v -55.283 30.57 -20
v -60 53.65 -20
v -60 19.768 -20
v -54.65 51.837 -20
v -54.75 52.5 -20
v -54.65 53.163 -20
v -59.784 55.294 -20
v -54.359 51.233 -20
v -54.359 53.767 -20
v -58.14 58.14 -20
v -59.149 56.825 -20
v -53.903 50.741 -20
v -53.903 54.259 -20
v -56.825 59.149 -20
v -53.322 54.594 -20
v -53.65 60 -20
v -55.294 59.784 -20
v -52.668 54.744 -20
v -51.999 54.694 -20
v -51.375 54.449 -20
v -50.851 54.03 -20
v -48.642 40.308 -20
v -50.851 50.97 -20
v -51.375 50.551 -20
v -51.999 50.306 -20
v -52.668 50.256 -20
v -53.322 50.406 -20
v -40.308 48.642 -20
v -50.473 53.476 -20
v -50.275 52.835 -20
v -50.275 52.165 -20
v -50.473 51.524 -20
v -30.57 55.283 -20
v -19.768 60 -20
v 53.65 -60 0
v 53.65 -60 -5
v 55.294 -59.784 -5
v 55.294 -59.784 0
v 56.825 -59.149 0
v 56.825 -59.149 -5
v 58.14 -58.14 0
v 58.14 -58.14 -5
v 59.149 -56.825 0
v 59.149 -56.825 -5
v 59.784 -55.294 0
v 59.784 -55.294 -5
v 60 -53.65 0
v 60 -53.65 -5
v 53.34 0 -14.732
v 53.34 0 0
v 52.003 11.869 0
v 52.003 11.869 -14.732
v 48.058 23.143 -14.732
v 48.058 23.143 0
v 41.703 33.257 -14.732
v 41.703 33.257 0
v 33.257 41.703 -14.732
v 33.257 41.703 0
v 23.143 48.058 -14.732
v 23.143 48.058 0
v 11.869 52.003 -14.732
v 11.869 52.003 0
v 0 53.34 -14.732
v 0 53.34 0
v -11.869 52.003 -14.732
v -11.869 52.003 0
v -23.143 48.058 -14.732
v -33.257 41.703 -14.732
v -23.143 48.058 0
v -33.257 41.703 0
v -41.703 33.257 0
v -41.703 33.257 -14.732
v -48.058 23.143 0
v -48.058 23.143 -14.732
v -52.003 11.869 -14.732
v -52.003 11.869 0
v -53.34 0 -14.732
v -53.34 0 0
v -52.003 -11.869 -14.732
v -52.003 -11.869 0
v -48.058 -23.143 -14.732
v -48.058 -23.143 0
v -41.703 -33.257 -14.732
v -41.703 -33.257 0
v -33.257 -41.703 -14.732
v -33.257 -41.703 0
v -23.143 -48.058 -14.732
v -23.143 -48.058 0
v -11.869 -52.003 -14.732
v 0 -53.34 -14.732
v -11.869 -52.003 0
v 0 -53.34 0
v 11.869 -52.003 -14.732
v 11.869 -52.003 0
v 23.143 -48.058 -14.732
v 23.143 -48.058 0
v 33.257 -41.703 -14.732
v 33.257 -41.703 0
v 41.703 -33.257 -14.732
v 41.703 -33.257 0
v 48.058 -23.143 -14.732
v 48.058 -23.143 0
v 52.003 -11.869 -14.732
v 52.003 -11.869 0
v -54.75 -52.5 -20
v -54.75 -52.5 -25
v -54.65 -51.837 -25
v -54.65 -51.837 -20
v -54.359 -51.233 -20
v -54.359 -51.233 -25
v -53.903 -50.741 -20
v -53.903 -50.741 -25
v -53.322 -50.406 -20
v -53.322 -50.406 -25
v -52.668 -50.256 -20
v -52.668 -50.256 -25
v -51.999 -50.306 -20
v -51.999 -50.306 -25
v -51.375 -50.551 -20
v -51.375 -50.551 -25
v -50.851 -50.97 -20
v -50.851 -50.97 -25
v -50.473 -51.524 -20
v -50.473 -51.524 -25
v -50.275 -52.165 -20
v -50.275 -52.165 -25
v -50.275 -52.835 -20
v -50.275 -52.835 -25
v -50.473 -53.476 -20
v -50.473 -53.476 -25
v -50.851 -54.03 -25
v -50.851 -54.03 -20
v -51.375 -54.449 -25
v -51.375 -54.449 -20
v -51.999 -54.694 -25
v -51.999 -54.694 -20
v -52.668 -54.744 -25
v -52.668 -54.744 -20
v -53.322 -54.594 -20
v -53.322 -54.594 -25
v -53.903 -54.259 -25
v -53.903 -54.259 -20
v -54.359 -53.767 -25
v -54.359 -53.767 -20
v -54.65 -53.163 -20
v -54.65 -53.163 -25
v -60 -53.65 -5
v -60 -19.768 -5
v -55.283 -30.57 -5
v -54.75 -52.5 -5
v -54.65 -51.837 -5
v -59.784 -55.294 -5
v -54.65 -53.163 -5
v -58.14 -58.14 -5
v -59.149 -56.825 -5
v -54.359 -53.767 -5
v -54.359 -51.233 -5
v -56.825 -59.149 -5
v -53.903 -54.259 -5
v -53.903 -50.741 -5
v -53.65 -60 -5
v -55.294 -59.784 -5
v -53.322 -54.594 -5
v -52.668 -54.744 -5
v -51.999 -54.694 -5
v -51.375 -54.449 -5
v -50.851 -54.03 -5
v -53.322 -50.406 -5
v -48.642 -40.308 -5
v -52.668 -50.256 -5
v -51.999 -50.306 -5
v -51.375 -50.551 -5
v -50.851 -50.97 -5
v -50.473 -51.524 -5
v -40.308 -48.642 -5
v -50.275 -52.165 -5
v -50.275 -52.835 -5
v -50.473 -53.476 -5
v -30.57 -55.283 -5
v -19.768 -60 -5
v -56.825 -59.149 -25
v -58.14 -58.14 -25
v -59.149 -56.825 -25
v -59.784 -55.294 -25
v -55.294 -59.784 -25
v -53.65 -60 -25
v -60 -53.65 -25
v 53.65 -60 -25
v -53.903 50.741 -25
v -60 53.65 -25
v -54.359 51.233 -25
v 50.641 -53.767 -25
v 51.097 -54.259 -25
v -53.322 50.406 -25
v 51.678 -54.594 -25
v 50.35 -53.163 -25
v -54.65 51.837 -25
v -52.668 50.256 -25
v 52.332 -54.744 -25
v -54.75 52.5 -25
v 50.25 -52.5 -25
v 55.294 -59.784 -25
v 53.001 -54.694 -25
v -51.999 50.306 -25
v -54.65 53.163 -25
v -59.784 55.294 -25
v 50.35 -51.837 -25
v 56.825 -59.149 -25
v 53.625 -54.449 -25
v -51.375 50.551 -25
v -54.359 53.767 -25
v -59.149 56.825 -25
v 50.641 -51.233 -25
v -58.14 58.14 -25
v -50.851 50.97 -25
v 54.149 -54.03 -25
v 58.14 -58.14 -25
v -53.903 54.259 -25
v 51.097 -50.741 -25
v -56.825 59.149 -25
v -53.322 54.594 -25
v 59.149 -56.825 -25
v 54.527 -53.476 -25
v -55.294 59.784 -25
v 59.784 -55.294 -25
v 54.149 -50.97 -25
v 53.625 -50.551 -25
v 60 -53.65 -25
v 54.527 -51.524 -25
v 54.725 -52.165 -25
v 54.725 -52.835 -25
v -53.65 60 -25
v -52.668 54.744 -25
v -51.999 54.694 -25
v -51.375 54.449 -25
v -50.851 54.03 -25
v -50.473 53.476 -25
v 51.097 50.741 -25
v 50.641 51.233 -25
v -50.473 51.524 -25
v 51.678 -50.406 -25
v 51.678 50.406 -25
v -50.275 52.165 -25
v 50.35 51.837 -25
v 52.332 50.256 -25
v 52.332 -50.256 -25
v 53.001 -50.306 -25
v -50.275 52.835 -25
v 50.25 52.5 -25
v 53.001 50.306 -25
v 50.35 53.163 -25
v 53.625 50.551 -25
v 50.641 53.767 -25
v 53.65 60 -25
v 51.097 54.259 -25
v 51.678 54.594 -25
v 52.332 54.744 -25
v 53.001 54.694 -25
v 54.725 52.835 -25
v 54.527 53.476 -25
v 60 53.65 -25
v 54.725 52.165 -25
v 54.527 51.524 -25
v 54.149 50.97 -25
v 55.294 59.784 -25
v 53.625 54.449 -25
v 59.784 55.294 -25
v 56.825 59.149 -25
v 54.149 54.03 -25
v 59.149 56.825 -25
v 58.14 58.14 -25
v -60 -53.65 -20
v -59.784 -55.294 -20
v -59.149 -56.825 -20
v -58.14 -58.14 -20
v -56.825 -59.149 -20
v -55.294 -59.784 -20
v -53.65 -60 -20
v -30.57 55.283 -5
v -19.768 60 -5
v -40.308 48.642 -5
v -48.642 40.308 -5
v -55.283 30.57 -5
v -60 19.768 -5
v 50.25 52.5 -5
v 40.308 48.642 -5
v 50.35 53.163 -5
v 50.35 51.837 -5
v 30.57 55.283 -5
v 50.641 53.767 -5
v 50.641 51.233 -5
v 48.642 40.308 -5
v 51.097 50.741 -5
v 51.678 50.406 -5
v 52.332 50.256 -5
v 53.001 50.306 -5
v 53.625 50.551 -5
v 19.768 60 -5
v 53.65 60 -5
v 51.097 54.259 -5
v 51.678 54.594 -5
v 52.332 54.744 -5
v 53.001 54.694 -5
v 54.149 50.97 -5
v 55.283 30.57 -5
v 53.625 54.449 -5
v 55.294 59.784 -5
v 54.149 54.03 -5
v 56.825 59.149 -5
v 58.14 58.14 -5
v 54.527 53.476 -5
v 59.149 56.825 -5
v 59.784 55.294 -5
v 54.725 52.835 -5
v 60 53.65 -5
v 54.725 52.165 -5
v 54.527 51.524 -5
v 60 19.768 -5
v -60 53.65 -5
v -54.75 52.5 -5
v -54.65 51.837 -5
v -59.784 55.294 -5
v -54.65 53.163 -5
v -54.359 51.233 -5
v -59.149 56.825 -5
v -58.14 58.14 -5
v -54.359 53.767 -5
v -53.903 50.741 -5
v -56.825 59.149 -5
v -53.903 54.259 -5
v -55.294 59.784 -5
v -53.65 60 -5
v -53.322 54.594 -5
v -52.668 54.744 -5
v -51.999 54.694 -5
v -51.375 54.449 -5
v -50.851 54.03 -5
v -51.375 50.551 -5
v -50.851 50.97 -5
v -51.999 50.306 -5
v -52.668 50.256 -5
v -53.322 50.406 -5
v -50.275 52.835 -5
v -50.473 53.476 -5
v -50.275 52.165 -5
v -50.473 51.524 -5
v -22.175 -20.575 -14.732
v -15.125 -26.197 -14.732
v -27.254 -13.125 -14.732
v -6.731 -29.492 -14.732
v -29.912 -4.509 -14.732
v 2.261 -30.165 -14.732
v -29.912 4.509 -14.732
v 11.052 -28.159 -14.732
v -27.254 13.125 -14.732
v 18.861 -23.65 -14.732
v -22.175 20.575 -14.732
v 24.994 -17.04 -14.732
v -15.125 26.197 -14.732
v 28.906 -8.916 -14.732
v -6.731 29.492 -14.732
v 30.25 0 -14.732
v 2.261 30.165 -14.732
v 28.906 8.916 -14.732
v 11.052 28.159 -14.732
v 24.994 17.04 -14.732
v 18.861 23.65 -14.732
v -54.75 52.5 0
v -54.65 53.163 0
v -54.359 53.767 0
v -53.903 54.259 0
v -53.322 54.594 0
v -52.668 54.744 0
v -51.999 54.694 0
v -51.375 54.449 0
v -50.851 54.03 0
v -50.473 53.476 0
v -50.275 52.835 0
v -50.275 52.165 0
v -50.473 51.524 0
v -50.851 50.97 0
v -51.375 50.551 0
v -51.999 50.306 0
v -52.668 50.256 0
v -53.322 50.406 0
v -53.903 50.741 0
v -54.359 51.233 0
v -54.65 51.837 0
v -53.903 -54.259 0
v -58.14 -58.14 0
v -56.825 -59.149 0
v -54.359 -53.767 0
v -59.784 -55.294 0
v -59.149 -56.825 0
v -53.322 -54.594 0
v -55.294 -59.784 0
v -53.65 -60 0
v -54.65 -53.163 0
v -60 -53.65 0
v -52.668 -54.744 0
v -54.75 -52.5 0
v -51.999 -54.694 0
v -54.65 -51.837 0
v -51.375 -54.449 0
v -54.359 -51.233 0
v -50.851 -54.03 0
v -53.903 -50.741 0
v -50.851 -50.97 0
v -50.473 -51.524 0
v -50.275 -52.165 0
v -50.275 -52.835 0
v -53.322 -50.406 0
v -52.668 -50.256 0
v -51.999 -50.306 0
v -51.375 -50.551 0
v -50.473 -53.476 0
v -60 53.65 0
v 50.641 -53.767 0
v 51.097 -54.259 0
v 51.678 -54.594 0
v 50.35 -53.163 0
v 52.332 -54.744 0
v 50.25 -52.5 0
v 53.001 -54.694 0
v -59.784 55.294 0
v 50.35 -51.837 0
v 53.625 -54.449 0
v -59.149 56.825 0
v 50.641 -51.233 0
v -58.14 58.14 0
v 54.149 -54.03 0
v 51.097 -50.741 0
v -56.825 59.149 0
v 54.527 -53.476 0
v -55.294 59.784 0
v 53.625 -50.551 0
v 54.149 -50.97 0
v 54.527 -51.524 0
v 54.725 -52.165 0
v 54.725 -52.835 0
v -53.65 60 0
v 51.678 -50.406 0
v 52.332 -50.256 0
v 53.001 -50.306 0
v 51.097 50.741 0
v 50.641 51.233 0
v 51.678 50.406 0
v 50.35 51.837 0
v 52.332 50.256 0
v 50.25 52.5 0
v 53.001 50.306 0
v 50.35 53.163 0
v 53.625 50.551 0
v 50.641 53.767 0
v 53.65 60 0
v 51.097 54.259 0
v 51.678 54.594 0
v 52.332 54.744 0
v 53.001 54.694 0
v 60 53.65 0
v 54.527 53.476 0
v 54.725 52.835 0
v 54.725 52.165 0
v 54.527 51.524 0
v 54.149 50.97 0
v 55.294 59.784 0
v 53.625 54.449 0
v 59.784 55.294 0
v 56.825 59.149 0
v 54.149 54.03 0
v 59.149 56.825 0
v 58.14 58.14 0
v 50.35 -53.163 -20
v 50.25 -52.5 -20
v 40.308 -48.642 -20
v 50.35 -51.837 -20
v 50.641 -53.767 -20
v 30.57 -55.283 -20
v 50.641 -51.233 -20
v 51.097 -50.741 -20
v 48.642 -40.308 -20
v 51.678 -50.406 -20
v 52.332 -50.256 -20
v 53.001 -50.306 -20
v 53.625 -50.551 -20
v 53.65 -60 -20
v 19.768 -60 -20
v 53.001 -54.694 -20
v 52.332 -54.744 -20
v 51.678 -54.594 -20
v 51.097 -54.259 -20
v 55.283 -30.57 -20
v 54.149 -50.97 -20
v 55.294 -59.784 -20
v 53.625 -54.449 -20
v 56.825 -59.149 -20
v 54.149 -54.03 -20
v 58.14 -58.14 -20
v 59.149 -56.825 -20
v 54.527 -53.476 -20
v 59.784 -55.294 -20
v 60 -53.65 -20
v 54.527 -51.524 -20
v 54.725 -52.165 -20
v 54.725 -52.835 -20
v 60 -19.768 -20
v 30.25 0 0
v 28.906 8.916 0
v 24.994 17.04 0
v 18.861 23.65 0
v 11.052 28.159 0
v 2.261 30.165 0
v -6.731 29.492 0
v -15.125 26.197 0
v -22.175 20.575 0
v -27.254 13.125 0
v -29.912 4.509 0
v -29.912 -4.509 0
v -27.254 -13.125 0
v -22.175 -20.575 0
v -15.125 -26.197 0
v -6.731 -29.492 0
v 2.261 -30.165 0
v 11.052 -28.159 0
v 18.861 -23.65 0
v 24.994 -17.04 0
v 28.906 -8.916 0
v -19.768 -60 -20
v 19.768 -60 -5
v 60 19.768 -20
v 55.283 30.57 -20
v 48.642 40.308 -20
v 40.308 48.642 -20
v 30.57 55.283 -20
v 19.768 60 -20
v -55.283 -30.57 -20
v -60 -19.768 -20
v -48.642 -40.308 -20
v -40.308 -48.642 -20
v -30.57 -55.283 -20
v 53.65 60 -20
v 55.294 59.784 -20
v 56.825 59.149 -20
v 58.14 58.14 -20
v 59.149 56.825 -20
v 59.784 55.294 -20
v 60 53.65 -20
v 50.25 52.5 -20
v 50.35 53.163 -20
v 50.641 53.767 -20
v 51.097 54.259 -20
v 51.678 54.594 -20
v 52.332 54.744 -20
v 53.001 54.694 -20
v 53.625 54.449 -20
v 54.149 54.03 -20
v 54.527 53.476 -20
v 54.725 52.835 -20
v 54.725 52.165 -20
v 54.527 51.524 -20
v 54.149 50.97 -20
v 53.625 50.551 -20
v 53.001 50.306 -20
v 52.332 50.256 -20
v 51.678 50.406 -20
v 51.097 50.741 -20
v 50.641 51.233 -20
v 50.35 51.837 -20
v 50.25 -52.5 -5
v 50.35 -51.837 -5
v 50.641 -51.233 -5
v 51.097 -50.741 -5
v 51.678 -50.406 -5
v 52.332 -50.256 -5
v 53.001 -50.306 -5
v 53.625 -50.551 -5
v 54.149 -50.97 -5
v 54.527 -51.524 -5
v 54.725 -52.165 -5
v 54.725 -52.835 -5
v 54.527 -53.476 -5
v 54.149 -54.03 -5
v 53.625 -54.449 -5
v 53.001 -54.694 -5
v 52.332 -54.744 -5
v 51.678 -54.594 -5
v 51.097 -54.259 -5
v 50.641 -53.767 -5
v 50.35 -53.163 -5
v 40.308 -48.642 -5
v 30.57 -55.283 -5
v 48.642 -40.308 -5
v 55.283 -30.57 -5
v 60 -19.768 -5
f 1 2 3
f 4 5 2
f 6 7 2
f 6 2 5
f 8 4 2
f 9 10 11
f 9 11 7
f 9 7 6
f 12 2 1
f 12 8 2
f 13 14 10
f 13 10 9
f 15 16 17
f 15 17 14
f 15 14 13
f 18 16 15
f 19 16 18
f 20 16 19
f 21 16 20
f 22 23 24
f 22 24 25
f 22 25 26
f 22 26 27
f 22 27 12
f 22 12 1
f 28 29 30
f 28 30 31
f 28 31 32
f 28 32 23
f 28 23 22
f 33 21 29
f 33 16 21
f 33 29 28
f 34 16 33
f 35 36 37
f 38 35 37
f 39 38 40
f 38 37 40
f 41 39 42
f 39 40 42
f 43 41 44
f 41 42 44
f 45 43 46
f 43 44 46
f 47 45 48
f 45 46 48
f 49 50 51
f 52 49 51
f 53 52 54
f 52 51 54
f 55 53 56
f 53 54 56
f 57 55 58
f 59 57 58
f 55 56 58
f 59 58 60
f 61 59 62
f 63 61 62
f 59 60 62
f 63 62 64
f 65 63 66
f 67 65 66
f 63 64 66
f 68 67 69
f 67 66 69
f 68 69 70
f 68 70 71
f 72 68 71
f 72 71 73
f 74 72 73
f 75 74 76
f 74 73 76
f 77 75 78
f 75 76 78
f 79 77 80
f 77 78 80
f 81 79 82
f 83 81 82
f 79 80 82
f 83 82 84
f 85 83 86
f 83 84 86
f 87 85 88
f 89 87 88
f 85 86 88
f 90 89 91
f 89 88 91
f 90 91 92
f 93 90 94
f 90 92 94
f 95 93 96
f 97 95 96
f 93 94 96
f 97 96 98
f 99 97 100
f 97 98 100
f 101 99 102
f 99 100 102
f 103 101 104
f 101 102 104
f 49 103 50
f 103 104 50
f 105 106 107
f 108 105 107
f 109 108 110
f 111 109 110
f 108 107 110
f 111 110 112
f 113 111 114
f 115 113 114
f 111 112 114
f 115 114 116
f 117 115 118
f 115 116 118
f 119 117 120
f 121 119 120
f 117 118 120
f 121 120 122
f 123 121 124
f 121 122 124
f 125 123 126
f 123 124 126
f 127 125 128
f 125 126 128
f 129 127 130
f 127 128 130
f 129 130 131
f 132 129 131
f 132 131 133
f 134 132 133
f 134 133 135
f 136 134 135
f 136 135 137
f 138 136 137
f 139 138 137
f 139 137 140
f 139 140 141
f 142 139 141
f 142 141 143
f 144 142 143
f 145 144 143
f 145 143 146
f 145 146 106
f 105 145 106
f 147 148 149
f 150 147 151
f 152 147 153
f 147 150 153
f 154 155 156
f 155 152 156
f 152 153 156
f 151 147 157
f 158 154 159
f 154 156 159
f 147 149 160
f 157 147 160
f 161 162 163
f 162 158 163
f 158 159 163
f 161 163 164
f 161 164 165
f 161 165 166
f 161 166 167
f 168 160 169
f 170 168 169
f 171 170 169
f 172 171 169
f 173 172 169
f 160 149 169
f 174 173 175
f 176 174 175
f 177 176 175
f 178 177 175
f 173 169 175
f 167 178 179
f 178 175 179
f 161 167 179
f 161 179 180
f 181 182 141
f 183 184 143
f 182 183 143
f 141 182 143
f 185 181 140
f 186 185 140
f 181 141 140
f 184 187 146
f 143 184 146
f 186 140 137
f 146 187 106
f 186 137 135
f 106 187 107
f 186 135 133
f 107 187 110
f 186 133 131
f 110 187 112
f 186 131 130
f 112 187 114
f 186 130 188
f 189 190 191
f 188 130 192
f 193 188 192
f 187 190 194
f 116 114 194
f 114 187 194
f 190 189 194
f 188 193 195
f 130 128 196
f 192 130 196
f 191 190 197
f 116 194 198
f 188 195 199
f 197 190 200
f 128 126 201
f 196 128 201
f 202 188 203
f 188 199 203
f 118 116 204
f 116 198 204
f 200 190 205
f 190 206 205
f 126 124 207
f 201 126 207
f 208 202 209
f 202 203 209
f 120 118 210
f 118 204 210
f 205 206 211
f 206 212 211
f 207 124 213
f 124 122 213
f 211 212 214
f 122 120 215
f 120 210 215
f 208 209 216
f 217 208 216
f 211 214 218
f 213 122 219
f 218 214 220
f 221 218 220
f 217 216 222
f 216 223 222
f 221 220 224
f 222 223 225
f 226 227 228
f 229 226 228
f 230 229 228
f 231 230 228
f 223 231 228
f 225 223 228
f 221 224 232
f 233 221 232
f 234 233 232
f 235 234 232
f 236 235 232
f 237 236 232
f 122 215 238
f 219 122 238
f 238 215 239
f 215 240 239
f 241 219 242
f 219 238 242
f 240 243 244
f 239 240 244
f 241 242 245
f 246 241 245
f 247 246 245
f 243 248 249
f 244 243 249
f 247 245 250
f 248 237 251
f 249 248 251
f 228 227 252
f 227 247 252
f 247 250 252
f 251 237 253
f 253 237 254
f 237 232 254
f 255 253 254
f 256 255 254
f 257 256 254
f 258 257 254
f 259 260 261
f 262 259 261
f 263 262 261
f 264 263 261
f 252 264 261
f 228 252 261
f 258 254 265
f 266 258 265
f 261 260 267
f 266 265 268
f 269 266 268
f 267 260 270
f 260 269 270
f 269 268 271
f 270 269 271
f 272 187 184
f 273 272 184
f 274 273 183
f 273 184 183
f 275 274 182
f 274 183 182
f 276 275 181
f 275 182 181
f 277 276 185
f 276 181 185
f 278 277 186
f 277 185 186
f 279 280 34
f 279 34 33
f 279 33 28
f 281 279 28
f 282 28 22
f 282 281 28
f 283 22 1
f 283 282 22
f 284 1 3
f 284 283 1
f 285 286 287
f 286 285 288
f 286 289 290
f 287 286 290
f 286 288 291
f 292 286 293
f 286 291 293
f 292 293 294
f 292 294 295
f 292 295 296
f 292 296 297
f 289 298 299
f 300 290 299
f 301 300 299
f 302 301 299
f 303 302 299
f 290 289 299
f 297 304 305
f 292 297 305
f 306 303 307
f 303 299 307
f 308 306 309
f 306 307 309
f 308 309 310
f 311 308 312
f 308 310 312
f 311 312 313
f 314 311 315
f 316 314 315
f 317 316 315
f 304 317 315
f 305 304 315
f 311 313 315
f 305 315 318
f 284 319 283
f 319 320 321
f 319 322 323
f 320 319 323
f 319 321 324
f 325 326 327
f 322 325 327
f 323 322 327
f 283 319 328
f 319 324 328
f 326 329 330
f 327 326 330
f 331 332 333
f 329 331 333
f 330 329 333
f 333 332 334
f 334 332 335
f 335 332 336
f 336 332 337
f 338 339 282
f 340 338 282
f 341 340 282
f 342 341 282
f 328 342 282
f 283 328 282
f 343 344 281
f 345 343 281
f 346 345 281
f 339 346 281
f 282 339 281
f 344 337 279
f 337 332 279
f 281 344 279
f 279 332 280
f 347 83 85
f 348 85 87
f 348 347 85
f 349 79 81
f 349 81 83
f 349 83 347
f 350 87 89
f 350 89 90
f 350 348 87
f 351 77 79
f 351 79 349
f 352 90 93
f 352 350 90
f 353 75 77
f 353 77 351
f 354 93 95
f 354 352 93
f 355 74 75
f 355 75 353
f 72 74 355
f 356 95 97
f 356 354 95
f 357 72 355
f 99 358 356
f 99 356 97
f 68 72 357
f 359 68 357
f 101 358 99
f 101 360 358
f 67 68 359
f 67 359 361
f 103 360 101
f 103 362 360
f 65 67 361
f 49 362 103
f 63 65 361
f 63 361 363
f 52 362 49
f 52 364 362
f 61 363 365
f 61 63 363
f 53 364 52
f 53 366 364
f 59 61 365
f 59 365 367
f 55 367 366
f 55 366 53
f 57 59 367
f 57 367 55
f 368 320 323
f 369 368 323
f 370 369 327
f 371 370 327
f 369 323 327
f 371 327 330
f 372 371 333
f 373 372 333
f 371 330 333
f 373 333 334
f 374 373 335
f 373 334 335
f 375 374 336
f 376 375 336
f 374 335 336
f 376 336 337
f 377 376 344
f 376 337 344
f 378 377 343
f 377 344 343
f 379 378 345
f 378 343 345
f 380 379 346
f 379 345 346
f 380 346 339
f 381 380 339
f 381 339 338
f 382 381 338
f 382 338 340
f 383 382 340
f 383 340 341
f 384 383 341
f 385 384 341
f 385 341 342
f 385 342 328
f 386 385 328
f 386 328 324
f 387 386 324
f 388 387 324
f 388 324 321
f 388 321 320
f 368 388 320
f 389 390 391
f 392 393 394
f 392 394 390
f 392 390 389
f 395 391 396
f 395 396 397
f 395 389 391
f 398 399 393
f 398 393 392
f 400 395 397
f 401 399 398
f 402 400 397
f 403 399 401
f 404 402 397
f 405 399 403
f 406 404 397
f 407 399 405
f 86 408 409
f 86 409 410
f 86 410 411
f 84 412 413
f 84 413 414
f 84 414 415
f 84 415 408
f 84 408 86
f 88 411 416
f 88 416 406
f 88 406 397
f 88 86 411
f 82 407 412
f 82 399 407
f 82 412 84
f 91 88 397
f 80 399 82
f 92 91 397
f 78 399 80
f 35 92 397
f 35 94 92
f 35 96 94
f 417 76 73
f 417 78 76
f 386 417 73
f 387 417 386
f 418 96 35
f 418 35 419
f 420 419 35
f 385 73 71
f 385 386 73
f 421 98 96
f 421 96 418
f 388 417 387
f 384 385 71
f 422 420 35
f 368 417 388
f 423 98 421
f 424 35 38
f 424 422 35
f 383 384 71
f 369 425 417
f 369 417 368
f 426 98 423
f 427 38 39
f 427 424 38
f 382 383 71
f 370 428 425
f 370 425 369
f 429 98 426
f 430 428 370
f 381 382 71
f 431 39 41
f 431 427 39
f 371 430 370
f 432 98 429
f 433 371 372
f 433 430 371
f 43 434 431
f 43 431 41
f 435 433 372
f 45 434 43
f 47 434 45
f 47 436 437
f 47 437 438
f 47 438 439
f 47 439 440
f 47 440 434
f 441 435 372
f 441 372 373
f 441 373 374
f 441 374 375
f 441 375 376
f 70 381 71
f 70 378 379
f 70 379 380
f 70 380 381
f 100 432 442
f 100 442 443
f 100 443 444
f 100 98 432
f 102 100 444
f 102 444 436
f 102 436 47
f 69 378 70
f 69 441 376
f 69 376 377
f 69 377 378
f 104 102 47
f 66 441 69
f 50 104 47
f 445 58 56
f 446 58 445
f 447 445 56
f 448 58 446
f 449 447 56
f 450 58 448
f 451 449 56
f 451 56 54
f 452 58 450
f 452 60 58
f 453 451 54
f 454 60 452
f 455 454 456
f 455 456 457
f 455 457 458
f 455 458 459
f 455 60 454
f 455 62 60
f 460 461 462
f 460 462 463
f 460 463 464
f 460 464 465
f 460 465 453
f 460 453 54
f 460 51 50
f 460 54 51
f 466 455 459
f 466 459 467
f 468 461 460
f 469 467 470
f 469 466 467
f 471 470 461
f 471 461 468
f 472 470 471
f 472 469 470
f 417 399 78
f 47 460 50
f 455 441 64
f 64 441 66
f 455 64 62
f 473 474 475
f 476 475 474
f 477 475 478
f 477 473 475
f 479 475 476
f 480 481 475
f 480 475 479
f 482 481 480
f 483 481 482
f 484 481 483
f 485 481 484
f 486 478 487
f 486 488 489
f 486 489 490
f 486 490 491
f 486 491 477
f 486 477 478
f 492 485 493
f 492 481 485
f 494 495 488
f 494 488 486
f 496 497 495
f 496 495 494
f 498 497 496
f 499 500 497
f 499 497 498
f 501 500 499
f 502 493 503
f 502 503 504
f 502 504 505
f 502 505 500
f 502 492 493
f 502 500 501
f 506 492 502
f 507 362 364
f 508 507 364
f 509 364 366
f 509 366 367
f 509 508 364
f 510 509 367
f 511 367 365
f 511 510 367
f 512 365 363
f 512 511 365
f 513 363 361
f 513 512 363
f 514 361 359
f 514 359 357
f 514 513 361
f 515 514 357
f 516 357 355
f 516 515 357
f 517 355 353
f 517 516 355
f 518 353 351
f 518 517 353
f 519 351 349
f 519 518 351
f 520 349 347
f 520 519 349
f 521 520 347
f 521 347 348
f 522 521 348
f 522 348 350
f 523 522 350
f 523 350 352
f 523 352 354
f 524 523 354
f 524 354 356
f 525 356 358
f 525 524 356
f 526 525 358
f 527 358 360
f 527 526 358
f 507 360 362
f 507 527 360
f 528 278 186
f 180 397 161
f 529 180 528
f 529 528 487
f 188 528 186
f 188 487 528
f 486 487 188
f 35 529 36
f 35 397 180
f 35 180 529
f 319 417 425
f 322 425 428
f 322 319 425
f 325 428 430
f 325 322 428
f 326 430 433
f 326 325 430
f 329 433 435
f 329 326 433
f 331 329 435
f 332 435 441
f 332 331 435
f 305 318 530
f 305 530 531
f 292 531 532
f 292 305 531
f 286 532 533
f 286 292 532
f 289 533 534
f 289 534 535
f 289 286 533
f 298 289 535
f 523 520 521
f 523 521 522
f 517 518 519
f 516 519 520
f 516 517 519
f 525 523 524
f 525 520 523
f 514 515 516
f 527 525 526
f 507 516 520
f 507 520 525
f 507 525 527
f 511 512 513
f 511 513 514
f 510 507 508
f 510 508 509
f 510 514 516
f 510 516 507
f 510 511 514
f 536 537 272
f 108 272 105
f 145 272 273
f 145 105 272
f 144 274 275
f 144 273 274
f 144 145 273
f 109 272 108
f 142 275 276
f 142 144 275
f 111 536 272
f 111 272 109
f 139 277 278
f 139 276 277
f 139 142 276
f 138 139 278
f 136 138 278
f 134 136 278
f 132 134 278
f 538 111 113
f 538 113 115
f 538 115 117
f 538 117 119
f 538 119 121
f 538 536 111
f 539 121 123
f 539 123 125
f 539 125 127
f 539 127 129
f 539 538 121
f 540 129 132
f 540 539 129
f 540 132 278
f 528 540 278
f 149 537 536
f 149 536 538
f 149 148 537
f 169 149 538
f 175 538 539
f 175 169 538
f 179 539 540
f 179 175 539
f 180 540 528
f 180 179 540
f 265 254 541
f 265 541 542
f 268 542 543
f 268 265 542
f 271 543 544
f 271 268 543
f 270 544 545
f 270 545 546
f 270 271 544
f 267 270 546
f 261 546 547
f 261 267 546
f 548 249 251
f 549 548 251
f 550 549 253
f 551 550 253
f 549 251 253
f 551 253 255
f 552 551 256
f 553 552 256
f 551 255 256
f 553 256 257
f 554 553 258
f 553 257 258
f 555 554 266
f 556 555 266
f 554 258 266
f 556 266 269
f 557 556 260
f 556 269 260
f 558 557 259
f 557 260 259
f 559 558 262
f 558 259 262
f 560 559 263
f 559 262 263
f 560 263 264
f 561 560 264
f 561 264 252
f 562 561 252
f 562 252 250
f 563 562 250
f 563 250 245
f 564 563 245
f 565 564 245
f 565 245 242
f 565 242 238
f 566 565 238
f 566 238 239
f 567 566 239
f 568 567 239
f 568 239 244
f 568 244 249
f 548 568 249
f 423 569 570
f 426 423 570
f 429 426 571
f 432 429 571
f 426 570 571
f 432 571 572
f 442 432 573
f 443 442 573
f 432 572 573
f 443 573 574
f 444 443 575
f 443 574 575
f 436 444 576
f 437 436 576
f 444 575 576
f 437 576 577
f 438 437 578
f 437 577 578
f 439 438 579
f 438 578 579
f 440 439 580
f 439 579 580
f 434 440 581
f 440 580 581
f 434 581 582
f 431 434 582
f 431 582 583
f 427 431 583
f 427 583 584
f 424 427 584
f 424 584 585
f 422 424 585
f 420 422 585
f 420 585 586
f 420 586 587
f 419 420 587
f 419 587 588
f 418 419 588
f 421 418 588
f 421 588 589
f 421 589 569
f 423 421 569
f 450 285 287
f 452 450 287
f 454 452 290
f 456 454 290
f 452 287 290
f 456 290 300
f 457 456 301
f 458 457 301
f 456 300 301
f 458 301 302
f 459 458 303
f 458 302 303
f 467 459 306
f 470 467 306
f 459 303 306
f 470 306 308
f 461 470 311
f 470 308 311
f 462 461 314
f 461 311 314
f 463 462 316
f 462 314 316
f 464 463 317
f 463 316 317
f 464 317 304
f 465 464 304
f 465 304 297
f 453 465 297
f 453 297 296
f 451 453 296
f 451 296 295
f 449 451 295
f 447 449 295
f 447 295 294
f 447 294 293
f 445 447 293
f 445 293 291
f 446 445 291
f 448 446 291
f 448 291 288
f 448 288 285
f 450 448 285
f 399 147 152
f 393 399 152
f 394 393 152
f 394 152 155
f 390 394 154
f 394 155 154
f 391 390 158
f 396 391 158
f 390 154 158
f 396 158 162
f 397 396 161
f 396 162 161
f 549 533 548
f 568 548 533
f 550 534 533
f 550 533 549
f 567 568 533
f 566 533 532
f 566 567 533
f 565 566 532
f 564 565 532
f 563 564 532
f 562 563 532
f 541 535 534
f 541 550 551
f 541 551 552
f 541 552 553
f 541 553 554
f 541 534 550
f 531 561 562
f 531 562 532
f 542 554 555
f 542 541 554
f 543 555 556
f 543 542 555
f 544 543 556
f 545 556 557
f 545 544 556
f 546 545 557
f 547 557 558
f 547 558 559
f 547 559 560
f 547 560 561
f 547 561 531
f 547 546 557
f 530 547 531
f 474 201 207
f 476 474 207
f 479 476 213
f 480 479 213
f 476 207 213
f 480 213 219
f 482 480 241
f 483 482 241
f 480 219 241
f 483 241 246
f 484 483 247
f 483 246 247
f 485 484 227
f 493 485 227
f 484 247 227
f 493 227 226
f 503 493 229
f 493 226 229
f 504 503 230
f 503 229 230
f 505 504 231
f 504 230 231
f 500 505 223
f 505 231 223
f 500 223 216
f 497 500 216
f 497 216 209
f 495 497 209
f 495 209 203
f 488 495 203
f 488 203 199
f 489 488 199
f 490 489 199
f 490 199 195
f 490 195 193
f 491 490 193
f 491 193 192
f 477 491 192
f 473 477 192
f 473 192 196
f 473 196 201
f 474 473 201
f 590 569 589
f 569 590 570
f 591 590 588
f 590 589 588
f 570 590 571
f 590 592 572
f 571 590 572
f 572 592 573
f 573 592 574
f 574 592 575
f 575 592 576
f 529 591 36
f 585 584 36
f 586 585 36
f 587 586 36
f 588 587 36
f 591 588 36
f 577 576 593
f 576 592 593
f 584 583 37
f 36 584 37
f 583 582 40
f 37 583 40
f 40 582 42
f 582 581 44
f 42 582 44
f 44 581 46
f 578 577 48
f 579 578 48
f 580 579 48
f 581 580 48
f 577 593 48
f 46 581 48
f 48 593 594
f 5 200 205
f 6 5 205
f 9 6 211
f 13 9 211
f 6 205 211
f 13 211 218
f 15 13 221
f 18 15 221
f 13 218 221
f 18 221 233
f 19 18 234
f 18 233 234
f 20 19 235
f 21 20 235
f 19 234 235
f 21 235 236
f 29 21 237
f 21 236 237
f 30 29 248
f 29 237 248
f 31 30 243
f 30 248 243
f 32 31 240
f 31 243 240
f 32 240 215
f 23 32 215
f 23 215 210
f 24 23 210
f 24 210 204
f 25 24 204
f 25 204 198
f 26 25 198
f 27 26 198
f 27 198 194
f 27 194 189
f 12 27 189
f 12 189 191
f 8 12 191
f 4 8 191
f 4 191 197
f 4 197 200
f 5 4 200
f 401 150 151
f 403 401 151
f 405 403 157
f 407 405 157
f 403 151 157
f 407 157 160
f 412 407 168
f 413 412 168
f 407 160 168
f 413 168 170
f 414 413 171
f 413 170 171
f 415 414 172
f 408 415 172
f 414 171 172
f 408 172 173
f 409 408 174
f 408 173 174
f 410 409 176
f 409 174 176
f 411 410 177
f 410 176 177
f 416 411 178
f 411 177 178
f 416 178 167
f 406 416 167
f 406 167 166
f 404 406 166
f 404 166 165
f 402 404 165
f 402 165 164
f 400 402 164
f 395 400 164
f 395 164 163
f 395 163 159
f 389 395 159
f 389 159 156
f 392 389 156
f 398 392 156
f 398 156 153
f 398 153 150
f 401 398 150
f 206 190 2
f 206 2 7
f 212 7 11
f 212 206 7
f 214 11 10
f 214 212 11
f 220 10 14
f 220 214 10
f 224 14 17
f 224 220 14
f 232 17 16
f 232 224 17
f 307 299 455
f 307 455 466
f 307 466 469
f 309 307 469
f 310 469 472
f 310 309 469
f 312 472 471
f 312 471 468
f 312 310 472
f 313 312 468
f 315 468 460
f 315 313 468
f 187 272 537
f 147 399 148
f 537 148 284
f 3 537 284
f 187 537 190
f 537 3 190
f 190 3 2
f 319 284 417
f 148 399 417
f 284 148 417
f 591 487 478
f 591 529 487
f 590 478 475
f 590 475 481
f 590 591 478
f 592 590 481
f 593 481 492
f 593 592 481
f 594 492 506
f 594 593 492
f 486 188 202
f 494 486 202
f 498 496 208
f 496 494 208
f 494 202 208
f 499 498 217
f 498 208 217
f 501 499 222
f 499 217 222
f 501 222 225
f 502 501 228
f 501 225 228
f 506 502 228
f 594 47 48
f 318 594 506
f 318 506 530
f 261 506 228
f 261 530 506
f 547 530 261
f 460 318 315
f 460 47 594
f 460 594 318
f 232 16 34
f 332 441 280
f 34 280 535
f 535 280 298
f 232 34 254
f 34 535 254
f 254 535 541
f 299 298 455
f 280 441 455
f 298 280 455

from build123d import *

# Parameters (mm, degrees)
F0_W     = 120
F0_H     = 120
F1_DEPTH = 25
F3_D     = 4.5
F4_R     = 53.34
F4_R_2   = 30.25
F5_DEPTH = 14.732
F6_R     = 6.35
F9_W     = 19.05
F9_H     = 15


with BuildPart() as f1:
    # F0 (on Top) → F1 (new body)
    with BuildSketch(Plane.XY):
        Rectangle(F0_W, F0_H)
    extrude(amount=-F1_DEPTH)

    # F3 (through all)
    with Locations(Plane.XY):
        with Locations((-52.5, -52.5), (52.5, -52.5), (52.5, 52.5), (-52.5, 52.5)):
            Hole(F3_D / 2)

    # F4 (on face) → F5 (cut)
    with BuildSketch(Plane.XY):
        Circle(F4_R)
        Circle(F4_R_2, mode=Mode.SUBTRACT)
    extrude(amount=-F5_DEPTH, mode=Mode.SUBTRACT)

    # F6
    f6_edges = [f1.edges().sort_by_distance(p)[0] for p in [
        (60, -60, -12.5),
        (-60, -60, -12.5),
        (60, 60, -12.5),
        (-60, 60, -12.5),
    ]]
    fillet(f6_edges, radius=F6_R)

    # F9 (on face) → F10 (revolve, cut)
    with BuildSketch(Plane(origin=(0, 0, 0), x_dir=(-0.7071067812, 0.7071067812, 0), z_dir=(0.7071067812, 0.7071067812, 0))):
        with Locations((-72.6975576213, -12.5)):
            Rectangle(F9_W, F9_H)
    revolve(axis=Axis((0, 0, 0), (0, 0, 1)), mode=Mode.SUBTRACT)


solid = f1.part
